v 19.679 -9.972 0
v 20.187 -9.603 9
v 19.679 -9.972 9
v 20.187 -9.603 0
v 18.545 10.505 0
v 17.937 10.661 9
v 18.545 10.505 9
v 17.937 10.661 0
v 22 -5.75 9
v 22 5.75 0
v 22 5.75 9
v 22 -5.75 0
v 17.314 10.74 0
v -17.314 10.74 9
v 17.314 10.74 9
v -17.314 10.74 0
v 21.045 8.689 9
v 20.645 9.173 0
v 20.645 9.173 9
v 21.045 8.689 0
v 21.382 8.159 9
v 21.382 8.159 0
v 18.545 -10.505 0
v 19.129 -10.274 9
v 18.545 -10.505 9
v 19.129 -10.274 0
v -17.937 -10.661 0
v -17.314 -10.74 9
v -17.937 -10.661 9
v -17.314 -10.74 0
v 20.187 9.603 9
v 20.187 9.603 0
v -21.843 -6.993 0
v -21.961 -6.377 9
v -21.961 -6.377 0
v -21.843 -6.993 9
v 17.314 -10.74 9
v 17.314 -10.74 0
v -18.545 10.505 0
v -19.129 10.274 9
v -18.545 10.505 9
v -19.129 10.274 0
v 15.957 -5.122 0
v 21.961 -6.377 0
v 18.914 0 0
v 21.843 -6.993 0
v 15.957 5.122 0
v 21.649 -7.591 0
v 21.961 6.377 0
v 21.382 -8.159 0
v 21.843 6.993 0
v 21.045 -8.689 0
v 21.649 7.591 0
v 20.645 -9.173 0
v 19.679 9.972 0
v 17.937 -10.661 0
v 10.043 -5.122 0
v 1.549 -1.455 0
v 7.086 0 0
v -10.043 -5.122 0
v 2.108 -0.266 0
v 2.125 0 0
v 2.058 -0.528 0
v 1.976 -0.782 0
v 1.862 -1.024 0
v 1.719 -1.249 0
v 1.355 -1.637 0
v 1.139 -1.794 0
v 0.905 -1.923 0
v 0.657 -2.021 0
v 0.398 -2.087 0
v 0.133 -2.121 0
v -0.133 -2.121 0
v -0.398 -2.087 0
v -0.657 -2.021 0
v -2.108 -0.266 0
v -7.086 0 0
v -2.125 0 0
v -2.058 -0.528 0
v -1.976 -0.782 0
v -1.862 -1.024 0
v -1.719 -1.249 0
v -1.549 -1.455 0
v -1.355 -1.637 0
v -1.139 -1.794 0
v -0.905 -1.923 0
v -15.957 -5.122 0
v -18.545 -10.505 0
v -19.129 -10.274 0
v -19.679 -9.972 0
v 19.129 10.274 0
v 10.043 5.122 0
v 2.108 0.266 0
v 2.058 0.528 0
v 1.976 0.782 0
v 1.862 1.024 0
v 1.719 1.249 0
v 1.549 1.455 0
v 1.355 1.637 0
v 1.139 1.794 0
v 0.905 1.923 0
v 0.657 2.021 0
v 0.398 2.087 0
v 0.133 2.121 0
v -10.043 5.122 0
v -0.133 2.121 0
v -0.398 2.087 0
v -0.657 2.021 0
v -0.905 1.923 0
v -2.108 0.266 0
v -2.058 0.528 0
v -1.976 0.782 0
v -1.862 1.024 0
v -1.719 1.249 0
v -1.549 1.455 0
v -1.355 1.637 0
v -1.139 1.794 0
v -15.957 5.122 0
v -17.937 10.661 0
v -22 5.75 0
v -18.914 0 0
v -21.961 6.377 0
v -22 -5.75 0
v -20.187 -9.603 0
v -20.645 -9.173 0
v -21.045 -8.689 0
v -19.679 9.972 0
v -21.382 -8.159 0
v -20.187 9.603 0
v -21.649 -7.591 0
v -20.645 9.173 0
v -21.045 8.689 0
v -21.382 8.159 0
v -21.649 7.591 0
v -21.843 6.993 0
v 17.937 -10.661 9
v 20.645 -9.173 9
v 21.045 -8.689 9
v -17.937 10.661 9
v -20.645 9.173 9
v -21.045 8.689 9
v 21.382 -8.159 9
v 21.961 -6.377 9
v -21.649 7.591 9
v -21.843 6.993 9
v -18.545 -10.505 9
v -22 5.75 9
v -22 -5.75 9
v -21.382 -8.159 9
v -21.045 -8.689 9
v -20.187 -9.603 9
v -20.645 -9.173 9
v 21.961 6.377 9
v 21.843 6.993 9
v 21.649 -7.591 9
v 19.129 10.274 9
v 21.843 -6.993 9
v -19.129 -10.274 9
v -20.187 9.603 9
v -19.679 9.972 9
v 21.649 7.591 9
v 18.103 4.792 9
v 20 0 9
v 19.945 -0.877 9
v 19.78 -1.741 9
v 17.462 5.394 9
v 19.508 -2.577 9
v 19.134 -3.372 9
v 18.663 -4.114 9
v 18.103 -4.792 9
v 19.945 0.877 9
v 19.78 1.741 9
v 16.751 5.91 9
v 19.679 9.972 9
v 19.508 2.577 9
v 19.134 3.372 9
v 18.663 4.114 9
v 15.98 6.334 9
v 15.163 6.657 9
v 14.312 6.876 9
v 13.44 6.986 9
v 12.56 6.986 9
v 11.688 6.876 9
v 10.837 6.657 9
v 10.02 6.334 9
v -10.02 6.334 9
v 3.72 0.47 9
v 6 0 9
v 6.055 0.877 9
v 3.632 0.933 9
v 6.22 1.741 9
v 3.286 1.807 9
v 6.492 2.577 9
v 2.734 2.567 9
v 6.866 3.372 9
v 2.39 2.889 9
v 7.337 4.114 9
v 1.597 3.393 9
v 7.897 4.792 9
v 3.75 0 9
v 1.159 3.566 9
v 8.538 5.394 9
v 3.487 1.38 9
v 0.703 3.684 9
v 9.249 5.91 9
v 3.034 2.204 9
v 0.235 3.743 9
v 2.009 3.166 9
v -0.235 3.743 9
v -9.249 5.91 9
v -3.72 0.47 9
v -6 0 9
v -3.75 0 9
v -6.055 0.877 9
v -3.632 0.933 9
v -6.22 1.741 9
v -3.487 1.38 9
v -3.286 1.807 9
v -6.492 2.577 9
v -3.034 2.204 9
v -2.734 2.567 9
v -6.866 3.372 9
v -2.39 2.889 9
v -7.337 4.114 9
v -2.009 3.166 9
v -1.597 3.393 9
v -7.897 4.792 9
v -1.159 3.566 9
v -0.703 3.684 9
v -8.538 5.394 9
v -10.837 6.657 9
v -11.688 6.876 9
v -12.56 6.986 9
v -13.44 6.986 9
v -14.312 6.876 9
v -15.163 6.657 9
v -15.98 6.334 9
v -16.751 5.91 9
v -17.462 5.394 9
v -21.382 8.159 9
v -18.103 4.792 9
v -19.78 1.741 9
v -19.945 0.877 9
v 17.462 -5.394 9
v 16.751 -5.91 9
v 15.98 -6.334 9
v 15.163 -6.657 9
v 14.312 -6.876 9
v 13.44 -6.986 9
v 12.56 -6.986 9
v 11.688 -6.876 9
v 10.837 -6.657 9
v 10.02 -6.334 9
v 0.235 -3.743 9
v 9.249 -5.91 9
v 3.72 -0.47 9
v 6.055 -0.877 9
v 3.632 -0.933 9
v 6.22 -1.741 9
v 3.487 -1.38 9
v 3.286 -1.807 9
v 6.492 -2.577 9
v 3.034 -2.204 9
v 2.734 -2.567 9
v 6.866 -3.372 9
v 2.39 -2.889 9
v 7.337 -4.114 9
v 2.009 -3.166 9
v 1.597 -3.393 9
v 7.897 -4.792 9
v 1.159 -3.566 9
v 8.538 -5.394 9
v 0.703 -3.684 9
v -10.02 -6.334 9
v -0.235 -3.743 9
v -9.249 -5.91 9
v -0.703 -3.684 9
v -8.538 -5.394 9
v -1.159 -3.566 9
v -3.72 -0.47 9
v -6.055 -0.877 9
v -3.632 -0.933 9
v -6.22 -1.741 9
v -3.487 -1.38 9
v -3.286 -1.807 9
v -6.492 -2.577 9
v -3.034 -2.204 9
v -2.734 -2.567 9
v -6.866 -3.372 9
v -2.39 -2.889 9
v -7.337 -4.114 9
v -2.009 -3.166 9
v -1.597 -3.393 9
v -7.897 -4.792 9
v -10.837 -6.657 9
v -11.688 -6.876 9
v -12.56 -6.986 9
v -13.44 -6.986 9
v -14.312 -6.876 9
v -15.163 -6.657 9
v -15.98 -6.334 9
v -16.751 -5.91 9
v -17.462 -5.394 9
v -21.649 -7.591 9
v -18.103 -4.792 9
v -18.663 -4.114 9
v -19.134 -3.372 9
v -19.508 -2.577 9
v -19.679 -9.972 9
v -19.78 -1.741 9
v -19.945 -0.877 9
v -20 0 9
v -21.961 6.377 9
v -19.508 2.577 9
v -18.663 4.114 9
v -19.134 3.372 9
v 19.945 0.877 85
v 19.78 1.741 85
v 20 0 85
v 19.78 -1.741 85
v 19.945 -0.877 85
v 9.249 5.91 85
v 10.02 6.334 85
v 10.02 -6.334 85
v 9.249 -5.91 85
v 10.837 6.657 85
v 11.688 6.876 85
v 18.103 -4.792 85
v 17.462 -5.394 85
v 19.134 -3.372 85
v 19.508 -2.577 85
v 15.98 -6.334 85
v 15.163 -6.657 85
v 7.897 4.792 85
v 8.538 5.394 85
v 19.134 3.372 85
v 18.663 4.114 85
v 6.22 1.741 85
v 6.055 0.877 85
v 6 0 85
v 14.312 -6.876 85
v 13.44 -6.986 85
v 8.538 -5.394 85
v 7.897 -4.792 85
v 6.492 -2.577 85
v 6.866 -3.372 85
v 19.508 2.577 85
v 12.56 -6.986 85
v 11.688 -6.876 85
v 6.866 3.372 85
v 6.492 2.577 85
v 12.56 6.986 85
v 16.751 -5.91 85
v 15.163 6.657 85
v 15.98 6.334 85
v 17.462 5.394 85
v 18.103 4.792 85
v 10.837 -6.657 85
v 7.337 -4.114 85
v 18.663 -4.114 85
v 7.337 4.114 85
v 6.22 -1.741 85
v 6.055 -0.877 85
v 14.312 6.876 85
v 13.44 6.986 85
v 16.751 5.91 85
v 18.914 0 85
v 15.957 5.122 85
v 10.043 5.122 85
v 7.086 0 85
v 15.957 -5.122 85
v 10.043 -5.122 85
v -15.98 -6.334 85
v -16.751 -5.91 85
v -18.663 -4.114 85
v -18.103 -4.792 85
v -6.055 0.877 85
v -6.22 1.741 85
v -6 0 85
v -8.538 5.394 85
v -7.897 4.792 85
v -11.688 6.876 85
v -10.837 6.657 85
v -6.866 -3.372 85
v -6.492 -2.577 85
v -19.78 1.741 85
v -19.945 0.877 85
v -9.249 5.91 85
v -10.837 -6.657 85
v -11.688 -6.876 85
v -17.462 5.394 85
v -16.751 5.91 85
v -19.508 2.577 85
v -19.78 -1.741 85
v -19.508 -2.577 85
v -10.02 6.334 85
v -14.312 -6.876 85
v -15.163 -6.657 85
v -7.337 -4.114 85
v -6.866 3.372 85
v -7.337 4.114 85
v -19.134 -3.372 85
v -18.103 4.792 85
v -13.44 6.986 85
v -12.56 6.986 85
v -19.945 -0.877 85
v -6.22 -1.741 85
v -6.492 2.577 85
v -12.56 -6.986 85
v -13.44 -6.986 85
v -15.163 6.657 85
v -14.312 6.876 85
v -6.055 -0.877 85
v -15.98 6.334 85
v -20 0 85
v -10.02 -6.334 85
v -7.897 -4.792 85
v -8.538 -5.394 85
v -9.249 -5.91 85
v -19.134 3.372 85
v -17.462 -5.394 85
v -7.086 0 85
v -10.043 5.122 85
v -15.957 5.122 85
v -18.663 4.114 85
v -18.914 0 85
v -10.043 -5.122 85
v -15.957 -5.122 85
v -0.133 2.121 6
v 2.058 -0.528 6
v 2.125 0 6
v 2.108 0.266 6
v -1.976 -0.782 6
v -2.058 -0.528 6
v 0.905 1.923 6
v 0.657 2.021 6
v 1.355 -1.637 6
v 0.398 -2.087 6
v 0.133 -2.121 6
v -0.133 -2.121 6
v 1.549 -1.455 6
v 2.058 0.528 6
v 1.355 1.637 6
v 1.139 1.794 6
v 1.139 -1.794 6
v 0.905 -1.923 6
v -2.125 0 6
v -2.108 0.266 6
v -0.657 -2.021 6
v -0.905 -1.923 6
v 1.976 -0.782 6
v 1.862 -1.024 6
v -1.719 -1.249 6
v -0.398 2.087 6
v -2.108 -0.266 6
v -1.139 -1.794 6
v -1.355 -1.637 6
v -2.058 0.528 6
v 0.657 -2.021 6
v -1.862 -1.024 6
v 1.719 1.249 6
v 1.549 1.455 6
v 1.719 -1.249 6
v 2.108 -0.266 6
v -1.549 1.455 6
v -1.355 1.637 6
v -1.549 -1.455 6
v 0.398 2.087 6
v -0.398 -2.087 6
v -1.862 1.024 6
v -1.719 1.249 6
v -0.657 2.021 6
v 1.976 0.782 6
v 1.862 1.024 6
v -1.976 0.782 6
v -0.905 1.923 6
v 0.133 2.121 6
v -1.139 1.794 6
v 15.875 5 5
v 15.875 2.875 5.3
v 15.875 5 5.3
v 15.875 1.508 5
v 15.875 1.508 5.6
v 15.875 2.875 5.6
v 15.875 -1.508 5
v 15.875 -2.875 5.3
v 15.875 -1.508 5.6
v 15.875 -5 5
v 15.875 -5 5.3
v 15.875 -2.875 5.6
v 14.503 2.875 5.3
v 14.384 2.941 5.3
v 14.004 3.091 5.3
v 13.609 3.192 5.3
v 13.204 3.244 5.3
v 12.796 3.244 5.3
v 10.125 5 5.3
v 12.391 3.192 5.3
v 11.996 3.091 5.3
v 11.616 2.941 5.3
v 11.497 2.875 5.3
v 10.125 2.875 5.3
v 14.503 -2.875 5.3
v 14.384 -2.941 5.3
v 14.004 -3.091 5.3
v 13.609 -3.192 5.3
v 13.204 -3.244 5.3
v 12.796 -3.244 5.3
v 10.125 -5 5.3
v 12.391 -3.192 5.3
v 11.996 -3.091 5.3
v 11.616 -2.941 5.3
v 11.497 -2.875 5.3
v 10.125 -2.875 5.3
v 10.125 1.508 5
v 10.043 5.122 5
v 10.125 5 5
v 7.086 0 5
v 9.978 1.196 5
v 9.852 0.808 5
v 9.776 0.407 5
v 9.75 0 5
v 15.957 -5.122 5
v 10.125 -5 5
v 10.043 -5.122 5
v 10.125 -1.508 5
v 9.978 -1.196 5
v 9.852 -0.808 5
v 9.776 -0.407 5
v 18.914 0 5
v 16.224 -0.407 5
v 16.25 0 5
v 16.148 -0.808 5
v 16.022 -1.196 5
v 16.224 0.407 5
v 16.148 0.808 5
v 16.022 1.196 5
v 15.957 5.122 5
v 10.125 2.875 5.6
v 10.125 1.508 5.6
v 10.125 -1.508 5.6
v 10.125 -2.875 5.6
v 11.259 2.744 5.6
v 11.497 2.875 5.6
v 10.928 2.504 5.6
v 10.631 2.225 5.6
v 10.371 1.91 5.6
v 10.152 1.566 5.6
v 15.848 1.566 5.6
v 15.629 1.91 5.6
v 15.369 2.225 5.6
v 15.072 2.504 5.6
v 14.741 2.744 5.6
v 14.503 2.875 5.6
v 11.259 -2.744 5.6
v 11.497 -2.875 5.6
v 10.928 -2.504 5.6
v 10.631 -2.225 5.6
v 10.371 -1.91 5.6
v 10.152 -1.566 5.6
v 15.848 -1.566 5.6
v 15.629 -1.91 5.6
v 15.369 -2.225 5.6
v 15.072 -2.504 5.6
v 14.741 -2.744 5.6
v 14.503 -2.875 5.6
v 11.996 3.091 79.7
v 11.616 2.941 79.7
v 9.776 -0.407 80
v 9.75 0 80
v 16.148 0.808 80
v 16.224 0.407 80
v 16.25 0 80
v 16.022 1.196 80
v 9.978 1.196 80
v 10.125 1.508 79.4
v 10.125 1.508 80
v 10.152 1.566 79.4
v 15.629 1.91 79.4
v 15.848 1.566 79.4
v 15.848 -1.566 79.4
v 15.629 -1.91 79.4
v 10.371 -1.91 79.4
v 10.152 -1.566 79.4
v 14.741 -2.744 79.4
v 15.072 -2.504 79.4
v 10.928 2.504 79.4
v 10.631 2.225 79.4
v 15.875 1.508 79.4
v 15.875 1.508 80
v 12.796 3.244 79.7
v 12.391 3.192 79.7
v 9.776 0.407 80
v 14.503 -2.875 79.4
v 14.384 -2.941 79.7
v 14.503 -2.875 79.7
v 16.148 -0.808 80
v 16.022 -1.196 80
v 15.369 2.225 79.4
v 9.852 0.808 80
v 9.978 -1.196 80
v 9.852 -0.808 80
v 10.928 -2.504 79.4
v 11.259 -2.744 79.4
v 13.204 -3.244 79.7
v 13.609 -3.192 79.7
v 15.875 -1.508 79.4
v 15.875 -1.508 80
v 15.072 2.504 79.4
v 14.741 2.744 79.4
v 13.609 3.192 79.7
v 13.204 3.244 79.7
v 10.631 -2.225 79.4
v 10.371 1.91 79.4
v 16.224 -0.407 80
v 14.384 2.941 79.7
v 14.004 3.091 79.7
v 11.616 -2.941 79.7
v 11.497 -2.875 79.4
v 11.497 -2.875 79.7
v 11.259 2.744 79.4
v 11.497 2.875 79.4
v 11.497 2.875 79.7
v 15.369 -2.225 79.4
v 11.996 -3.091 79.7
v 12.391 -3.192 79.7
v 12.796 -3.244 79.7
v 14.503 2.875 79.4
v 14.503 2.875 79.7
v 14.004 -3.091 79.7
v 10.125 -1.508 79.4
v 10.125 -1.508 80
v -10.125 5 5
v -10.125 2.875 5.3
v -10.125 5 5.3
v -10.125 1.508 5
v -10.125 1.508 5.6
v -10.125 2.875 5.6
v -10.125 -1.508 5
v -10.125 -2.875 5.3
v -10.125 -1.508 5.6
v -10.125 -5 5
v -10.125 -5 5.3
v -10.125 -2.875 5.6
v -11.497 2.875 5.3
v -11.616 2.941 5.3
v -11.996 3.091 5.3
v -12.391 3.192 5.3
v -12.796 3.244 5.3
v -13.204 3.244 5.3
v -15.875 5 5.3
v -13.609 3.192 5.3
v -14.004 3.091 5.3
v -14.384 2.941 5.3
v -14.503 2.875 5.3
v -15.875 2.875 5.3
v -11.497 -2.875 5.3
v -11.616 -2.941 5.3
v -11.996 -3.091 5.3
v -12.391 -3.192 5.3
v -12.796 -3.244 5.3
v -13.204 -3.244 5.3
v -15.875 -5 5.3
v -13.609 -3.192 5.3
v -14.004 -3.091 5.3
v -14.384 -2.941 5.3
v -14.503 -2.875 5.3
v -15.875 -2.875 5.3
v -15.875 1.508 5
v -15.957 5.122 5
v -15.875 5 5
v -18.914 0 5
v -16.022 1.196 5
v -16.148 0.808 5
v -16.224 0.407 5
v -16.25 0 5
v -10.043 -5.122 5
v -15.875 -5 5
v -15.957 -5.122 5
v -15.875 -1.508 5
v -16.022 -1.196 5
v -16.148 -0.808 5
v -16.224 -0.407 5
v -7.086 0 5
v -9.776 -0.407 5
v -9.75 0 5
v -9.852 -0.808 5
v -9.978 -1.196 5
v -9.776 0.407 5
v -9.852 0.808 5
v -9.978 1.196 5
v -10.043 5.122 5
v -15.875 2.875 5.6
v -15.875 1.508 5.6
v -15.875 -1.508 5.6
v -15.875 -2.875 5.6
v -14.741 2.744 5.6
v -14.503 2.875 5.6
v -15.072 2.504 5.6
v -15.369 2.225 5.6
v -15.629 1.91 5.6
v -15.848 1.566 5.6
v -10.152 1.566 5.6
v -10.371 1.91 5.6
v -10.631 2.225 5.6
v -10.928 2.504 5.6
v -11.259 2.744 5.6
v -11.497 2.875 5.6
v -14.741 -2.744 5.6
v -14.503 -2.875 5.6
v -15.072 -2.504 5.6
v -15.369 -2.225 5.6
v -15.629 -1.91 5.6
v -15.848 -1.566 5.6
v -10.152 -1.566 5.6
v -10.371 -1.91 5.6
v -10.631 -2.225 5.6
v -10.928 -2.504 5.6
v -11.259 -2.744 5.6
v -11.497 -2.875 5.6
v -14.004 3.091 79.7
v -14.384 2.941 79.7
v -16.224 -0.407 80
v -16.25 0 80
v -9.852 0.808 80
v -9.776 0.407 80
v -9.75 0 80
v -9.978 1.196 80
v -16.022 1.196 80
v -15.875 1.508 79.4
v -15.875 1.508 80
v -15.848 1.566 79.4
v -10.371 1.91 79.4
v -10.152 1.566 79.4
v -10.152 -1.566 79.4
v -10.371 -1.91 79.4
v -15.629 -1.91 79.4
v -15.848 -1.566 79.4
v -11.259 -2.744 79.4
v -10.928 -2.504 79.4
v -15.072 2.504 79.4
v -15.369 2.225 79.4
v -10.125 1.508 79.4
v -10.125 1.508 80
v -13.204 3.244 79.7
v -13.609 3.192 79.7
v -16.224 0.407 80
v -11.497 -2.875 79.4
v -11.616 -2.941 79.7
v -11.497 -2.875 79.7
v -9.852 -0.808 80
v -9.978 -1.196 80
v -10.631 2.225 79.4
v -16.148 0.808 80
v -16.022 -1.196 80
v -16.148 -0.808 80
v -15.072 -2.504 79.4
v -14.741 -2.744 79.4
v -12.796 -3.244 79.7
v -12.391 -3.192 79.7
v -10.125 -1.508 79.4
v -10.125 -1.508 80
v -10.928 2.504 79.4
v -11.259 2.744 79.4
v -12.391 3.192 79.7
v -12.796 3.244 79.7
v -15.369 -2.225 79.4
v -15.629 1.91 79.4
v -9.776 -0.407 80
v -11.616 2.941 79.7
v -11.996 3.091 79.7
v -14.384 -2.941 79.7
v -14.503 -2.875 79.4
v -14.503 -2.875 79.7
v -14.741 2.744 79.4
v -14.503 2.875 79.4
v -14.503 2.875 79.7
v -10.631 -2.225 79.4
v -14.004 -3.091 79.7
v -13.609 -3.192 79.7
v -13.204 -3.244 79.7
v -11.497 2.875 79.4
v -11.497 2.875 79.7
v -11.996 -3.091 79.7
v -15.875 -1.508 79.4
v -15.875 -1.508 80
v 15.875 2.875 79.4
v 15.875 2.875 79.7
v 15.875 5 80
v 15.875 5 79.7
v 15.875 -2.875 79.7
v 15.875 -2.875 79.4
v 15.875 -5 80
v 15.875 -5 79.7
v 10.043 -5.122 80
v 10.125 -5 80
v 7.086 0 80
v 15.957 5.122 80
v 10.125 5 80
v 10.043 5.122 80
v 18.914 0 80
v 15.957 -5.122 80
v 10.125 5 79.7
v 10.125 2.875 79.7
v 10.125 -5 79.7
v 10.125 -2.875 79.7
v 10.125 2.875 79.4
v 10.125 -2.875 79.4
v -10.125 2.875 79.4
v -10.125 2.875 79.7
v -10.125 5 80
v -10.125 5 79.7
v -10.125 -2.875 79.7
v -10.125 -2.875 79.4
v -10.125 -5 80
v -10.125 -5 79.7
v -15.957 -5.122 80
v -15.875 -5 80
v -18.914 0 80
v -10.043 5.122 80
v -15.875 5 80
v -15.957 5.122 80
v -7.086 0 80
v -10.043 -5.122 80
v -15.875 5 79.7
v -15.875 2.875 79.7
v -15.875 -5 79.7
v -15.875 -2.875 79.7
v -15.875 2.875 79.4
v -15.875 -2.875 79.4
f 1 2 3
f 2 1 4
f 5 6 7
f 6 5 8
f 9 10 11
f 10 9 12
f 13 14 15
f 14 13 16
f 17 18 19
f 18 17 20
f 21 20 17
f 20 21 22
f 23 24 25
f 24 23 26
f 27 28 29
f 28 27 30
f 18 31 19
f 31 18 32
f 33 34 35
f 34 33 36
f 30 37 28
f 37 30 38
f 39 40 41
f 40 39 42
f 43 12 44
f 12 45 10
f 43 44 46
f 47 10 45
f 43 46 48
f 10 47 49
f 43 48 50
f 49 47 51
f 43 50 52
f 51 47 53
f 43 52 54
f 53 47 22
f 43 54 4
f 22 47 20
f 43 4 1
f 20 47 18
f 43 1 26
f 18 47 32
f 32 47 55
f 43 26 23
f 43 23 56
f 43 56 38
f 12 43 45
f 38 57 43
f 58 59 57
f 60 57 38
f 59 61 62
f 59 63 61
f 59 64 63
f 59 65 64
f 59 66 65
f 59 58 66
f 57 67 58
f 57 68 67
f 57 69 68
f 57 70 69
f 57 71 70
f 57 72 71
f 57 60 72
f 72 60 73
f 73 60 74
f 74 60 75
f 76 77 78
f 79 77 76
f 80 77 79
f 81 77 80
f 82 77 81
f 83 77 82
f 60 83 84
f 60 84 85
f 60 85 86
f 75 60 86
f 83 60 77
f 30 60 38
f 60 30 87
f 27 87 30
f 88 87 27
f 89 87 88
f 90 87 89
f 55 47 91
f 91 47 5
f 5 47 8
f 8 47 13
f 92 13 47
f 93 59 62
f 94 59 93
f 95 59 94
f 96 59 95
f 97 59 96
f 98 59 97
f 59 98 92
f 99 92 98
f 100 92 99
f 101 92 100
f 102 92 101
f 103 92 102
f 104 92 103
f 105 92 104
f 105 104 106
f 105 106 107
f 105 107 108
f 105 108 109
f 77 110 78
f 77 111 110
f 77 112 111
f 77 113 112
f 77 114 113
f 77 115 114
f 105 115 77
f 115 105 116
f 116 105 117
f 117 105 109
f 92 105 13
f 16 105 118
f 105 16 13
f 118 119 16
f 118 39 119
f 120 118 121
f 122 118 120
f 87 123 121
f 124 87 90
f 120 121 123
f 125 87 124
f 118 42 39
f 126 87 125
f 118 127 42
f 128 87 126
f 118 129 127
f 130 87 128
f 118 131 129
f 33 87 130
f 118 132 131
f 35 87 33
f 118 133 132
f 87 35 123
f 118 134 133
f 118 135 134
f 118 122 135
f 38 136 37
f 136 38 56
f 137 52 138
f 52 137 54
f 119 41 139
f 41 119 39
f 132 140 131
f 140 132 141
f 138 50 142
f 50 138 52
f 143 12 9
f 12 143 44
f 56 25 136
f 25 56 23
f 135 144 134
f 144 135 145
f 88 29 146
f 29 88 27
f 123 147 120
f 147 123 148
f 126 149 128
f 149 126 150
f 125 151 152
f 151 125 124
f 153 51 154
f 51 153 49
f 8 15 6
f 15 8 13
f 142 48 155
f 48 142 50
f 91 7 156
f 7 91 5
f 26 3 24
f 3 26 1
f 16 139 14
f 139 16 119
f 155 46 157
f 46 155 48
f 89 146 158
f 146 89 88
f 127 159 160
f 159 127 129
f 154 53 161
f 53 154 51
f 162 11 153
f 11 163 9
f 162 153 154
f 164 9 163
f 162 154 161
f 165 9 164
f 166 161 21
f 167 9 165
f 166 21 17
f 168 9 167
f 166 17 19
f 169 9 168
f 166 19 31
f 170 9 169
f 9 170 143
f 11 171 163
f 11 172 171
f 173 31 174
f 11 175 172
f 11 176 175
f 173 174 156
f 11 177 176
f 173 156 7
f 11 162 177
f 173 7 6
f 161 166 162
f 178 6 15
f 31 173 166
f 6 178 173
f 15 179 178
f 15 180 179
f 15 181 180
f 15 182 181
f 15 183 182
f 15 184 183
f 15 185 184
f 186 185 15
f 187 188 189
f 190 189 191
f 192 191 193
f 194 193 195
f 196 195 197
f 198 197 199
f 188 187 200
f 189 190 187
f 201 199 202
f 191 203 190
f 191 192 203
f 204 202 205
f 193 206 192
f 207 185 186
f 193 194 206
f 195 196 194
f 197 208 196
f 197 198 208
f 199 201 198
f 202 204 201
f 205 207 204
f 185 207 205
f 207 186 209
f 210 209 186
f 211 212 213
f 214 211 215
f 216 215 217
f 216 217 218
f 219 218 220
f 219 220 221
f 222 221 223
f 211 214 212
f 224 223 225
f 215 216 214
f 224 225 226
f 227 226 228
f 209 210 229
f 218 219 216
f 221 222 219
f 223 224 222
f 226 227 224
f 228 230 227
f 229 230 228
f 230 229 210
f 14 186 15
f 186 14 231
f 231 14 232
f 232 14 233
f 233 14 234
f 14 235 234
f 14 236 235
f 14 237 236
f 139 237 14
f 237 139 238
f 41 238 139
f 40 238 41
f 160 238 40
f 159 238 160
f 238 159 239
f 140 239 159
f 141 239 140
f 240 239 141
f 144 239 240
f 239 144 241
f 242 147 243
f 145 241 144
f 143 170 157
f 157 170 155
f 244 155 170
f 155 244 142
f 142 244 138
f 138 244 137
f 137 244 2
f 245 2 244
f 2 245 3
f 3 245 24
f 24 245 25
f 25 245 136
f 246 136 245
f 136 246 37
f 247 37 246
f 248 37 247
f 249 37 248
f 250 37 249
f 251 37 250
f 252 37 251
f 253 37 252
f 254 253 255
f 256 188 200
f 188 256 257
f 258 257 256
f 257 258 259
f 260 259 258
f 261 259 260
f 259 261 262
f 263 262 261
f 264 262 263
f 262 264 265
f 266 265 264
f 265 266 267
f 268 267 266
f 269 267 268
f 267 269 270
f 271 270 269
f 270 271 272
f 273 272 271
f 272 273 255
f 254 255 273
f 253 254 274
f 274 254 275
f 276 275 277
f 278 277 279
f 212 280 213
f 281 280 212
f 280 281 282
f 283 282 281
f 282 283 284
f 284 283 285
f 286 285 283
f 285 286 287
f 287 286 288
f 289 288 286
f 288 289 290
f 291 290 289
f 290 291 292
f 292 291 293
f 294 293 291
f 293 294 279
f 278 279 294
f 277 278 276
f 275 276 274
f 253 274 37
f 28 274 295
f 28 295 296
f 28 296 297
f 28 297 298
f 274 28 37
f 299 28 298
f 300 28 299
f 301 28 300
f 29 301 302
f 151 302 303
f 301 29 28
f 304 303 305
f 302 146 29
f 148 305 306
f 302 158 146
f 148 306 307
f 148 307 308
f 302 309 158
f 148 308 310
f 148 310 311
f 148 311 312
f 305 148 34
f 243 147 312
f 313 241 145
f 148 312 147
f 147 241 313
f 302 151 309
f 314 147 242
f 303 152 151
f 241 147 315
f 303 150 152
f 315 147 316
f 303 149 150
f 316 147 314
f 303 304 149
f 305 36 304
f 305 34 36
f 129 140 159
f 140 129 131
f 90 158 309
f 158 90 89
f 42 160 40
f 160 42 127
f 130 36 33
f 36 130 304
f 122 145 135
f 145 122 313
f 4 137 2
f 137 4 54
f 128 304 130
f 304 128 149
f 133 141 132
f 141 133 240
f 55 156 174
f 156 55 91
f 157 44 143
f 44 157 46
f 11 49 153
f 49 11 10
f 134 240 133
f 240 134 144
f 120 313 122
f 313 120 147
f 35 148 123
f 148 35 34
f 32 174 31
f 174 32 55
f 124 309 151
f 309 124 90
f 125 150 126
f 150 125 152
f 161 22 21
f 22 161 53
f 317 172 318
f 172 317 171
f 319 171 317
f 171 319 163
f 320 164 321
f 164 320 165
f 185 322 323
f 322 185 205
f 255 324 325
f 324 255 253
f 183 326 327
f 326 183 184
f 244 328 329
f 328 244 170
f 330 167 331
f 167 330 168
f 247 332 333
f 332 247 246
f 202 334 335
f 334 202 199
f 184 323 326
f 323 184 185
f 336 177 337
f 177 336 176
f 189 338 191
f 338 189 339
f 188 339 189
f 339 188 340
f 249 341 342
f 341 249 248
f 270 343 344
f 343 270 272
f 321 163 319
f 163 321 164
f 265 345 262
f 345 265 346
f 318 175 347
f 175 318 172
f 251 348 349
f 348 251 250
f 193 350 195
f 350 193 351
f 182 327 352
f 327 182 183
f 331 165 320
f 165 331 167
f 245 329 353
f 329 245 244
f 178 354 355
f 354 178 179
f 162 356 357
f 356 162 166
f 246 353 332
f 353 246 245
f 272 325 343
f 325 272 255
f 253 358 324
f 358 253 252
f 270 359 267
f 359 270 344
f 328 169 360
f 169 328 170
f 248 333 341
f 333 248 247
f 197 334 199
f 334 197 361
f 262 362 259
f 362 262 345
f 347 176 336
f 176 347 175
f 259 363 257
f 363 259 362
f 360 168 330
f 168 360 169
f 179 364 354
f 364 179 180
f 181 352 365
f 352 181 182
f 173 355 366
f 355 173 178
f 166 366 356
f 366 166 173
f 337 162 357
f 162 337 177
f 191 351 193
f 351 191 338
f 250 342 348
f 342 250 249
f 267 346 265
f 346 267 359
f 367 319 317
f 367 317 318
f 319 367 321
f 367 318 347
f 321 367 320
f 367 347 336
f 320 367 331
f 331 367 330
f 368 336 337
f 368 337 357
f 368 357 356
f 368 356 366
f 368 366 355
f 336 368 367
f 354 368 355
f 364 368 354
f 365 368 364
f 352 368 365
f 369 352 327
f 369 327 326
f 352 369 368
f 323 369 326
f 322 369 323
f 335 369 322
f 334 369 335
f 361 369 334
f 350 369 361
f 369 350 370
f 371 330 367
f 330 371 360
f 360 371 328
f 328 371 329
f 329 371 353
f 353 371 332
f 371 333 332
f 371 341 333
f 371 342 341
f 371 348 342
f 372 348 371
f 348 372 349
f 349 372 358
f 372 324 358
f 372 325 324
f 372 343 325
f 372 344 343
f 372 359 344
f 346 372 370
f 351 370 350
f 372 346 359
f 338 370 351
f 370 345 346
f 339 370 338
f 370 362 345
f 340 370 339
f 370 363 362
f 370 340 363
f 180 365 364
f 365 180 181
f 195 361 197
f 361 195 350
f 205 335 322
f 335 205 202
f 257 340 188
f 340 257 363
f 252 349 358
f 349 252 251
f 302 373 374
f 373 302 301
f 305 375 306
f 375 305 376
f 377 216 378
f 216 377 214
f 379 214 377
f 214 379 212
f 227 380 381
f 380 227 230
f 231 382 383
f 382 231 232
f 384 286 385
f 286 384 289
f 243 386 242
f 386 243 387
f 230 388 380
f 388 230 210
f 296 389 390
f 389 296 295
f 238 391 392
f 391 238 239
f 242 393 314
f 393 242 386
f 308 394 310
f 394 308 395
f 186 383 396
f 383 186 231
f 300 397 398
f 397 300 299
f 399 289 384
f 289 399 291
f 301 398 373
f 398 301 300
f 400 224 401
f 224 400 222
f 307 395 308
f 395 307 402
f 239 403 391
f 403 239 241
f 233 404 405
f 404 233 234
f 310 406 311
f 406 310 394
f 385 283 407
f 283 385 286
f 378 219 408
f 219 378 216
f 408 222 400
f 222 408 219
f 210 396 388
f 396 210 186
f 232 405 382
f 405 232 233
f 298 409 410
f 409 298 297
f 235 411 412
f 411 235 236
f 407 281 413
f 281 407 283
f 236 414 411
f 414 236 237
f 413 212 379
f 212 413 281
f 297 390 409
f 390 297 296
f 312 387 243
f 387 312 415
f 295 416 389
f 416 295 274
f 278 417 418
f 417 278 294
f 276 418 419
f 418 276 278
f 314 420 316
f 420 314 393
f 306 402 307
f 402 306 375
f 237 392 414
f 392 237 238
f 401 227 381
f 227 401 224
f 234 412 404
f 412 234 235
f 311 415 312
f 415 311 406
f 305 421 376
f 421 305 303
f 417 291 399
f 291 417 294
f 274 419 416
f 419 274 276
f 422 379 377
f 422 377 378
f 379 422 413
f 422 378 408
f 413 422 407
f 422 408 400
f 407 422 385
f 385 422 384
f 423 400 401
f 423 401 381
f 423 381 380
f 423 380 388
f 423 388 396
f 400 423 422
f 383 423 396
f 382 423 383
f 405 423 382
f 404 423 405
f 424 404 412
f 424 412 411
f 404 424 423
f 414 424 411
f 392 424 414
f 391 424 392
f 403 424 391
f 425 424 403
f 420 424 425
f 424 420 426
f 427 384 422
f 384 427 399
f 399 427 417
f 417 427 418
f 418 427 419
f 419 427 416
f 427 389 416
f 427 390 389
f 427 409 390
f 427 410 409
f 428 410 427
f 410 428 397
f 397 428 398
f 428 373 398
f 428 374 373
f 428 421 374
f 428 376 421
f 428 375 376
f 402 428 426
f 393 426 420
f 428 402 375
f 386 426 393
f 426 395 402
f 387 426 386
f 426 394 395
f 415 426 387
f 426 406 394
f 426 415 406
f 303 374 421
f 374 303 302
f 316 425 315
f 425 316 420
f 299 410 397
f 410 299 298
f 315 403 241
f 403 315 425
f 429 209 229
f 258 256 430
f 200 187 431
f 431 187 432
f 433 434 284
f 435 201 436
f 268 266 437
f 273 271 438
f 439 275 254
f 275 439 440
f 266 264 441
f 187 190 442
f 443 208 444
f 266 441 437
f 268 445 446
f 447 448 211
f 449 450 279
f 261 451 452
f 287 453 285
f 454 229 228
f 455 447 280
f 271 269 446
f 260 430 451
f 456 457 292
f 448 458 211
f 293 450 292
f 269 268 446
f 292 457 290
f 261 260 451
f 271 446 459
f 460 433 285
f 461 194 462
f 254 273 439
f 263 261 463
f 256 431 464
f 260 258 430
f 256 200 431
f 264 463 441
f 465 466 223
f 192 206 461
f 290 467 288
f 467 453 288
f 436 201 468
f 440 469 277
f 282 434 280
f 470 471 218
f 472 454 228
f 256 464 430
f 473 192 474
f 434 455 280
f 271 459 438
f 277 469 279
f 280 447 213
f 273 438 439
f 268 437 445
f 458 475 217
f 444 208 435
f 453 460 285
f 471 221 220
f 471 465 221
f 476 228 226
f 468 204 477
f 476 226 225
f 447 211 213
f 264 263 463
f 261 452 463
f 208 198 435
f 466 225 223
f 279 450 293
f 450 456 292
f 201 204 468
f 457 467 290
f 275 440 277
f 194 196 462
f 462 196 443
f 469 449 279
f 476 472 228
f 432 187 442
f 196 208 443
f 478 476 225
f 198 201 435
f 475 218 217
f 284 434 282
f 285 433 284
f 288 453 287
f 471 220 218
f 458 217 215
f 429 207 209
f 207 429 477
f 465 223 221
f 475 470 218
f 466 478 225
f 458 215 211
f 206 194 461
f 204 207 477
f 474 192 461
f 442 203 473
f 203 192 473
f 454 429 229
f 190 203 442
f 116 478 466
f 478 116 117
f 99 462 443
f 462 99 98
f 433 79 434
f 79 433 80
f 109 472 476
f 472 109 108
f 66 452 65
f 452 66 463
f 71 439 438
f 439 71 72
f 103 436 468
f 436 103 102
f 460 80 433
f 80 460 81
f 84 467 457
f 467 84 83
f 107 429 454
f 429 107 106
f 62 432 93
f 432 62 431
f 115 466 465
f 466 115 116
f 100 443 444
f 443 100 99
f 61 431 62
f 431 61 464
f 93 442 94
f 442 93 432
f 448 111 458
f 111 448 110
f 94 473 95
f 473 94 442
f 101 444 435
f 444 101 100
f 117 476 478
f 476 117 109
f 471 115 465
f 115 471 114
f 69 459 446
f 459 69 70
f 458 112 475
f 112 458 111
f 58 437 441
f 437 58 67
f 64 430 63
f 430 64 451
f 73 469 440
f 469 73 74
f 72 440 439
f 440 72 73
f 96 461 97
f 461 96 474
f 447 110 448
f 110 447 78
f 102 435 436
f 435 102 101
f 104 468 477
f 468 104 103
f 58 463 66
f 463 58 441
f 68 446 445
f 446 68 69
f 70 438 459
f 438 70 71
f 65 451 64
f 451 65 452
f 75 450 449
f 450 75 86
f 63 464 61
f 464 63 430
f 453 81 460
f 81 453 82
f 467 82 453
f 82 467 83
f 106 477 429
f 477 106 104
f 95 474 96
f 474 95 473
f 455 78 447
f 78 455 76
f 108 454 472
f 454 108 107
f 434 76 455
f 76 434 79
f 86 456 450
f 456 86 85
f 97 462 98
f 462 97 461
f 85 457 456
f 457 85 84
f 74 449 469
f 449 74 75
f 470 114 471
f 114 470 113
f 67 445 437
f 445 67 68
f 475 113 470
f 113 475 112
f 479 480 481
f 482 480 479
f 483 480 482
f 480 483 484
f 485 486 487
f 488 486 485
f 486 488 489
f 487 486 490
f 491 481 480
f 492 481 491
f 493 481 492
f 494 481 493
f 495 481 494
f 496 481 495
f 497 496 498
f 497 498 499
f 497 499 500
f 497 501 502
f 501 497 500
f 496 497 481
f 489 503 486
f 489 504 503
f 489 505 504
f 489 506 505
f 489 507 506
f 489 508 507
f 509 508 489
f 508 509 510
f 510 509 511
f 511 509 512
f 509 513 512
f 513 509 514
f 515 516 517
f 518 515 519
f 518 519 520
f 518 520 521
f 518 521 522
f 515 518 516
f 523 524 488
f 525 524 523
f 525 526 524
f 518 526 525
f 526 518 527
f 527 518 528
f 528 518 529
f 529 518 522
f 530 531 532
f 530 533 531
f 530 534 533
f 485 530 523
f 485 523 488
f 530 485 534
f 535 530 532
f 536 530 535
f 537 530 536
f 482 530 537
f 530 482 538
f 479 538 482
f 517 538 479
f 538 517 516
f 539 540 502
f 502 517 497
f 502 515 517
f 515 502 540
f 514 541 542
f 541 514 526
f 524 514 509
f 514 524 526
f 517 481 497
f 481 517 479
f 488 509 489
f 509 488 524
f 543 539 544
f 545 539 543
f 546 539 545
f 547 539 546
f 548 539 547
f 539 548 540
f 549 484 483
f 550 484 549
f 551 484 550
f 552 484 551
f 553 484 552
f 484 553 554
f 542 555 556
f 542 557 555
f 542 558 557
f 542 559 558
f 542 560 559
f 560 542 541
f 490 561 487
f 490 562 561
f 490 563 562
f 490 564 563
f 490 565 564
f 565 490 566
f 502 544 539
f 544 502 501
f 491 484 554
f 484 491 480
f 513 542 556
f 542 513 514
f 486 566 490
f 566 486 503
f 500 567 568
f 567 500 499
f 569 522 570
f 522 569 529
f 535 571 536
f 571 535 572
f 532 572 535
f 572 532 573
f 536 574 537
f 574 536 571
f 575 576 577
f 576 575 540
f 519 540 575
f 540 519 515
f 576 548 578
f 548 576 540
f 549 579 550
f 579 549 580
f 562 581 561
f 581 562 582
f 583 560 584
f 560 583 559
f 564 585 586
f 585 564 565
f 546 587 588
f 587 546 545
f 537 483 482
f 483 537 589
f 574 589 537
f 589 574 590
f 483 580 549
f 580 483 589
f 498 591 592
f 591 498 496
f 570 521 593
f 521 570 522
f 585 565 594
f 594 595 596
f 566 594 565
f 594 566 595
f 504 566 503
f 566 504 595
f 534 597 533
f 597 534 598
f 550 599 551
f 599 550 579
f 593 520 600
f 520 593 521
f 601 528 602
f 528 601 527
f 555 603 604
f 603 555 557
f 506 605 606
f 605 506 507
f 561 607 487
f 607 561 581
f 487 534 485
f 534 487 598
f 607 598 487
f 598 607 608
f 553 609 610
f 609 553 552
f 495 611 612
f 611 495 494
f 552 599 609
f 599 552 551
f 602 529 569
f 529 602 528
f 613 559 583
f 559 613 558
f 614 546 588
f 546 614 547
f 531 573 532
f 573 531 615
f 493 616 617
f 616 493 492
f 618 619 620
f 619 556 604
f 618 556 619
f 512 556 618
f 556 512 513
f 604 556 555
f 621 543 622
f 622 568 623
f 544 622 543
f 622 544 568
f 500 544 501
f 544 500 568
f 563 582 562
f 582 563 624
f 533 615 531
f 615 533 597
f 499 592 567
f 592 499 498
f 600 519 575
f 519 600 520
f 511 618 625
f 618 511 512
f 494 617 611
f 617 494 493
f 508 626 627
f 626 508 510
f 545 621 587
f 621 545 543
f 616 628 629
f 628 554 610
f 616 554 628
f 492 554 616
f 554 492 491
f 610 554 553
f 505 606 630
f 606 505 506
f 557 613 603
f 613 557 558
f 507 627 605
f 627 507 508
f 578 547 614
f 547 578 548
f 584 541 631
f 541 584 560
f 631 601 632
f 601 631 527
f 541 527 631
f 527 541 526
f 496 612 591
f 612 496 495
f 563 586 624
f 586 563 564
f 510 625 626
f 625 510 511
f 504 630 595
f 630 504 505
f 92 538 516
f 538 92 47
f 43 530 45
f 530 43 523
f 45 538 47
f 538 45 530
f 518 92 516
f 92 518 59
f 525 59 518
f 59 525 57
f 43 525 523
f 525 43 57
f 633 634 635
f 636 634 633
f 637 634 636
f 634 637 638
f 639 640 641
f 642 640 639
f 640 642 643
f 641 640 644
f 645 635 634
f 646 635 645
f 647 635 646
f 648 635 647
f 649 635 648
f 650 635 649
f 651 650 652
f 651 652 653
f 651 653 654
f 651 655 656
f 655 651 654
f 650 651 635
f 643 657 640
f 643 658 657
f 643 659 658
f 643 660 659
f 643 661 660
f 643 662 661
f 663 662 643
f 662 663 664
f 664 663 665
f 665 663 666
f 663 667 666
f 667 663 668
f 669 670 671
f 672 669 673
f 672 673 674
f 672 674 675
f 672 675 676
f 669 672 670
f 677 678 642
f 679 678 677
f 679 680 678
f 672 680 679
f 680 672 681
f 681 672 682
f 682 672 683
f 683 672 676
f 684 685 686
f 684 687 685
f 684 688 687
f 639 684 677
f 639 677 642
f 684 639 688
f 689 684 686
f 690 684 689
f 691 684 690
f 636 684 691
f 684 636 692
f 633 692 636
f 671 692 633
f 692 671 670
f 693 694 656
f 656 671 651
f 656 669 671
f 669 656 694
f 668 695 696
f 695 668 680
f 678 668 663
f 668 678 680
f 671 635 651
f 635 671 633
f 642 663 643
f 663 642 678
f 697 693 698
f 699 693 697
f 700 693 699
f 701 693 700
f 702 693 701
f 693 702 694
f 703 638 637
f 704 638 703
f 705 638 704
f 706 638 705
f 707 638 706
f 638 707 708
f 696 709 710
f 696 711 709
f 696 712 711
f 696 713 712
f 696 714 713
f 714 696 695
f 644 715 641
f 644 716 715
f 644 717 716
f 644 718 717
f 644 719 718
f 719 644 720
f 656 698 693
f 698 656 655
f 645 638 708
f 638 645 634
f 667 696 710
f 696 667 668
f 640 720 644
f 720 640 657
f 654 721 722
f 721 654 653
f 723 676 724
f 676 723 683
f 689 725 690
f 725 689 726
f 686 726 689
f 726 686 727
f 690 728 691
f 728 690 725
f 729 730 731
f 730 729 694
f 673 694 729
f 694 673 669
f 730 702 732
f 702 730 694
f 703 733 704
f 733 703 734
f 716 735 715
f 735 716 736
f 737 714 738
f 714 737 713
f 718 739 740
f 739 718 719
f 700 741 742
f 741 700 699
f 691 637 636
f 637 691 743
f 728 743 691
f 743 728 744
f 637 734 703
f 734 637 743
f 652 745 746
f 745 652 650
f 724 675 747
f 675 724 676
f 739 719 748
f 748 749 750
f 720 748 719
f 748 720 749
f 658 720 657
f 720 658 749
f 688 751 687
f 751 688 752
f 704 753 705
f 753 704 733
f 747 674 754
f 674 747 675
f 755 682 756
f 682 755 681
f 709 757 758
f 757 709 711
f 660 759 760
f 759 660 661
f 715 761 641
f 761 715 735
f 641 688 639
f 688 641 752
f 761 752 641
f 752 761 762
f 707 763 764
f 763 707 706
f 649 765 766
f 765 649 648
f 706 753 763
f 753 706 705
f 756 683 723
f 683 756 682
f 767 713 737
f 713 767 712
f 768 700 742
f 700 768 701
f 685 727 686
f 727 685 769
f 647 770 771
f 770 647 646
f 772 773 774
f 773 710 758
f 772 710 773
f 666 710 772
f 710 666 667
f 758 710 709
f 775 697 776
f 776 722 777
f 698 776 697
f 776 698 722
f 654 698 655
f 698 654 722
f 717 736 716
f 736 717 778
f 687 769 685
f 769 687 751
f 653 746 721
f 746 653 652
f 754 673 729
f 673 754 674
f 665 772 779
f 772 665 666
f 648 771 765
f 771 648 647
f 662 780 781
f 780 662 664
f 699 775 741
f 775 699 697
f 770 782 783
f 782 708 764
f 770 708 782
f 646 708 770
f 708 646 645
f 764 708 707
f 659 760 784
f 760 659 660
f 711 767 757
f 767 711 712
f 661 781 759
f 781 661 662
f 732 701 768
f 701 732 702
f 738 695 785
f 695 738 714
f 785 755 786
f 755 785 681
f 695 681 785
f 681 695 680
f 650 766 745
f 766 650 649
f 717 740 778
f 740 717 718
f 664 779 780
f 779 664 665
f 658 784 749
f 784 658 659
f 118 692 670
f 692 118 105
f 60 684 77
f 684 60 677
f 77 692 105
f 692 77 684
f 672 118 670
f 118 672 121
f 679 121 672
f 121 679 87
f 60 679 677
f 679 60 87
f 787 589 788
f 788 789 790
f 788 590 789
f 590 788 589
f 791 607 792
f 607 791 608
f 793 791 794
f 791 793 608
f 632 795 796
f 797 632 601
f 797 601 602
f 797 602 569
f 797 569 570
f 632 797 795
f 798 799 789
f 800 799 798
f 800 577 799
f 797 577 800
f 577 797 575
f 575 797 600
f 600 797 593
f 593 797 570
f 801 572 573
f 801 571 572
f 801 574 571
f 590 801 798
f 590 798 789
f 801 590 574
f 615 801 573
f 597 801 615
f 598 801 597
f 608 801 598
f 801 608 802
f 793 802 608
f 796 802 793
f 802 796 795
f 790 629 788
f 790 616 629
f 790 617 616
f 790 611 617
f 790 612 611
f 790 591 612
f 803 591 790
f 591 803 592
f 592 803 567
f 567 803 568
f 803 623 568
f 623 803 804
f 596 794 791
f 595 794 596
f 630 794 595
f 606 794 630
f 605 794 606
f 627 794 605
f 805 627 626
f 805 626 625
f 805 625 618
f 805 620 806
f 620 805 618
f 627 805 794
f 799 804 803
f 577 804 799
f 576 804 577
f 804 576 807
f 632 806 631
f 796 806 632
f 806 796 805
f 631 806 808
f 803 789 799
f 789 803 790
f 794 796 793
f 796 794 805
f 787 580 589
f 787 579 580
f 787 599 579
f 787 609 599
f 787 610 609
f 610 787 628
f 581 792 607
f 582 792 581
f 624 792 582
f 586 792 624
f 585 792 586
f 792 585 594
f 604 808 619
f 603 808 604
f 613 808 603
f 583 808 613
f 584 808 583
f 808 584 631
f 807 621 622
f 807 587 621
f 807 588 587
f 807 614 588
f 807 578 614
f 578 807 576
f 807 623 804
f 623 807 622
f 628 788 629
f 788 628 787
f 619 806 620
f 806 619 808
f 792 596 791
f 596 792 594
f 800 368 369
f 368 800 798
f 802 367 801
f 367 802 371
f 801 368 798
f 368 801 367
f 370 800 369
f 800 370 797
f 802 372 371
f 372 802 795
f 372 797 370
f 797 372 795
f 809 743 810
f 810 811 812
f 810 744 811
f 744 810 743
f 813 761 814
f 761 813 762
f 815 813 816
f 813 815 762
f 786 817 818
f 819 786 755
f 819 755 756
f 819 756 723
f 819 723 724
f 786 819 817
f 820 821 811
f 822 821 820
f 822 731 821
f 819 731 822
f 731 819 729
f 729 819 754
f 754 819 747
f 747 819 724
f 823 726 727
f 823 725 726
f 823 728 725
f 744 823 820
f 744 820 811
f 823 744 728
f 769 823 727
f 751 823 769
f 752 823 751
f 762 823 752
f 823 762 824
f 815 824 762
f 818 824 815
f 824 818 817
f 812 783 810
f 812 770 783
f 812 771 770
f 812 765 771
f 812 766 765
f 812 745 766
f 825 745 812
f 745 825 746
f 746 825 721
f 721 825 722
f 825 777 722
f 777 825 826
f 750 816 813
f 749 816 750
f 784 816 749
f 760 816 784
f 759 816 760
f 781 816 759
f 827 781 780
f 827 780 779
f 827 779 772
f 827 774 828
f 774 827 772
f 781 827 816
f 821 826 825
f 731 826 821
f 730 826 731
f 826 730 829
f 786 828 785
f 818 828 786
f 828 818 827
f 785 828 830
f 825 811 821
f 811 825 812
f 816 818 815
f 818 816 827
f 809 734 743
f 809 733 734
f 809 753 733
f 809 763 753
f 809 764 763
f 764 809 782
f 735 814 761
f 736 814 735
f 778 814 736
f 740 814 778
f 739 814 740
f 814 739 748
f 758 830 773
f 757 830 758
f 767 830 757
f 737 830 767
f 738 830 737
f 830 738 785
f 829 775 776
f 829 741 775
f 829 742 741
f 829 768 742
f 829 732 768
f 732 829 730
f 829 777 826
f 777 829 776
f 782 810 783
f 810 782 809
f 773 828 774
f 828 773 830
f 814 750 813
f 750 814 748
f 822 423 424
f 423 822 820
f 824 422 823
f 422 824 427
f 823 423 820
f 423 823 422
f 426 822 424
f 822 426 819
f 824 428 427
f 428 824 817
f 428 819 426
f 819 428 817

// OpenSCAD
$fn = 50;


difference() {
	union() {
		hull() {
			translate(v = [-17.0000000000, 5.7500000000, 0]) {
				cylinder(h = 9, r = 5);
			}
			translate(v = [17.0000000000, 5.7500000000, 0]) {
				cylinder(h = 9, r = 5);
			}
			translate(v = [-17.0000000000, -5.7500000000, 0]) {
				cylinder(h = 9, r = 5);
			}
			translate(v = [17.0000000000, -5.7500000000, 0]) {
				cylinder(h = 9, r = 5);
			}
		}
		translate(v = [13.0000000000, 0, 0.0000000000]) {
			cylinder(h = 85, r = 7.0000000000);
		}
		translate(v = [-13.0000000000, 0, 0.0000000000]) {
			cylinder(h = 85, r = 7.0000000000);
		}
		translate(v = [13.0000000000, 0, 79.0000000000]) {
			cylinder(h = 6, r = 7.0000000000);
		}
		translate(v = [-13.0000000000, 0, 79.0000000000]) {
			cylinder(h = 6, r = 7.0000000000);
		}
	}
	union() {
		translate(v = [0, 0, 9]) {
			rotate(a = [0, 0, 0]) {
				difference() {
					union() {
						#translate(v = [0, 0, -80.0000000000]) {
							cylinder(h = 80, r = 2.0000000000);
						}
						#translate(v = [0, 0, -3]) {
							cylinder(h = 3, r1 = 2.1250000000, r2 = 3.7500000000);
						}
						#translate(v = [0, 0, -80.0000000000]) {
							cylinder(h = 80, r = 2.1250000000);
						}
						#translate(v = [0, 0, -80.0000000000]) {
							cylinder(h = 80, r = 2.0000000000);
						}
					}
					union();
				}
			}
		}
		translate(v = [13.0000000000, 0, 0]) {
			rotate(a = [0, 0, 0]) {
				difference() {
					union() {
						#translate(v = [-2.8750000000, -5.0000000000, -0.3000000000]) {
							cube(size = [5.7500000000, 10, 0.3000000000]);
						}
						#translate(v = [-2.8750000000, -2.8750000000, -0.6000000000]) {
							cube(size = [5.7500000000, 5.7500000000, 0.3000000000]);
						}
						#translate(v = [-2.8750000000, -5.0000000000, 5]) {
							cube(size = [5.7500000000, 10, 0.3000000000]);
						}
						#translate(v = [-2.8750000000, -2.8750000000, 5.3000000000]) {
							cube(size = [5.7500000000, 5.7500000000, 0.3000000000]);
						}
						#translate(v = [0, 0, -100.0000000000]) {
							cylinder(h = 200, r = 3.2500000000);
						}
						#linear_extrude(height = 5) {
							polygon(points = [[5.9142500000, 0.0000000000], [2.9571250000, 5.1218907443], [-2.9571250000, 5.1218907443], [-5.9142500000, 0.0000000000], [-2.9571250000, -5.1218907443], [2.9571250000, -5.1218907443]]);
						}
						#translate(v = [-2.8750000000, -5.0000000000, -0.3000000000]) {
							cube(size = [5.7500000000, 10, 0.3000000000]);
						}
						#translate(v = [-2.8750000000, -2.8750000000, -0.6000000000]) {
							cube(size = [5.7500000000, 5.7500000000, 0.3000000000]);
						}
						#translate(v = [-2.8750000000, -5.0000000000, 5]) {
							cube(size = [5.7500000000, 10, 0.3000000000]);
						}
						#translate(v = [-2.8750000000, -2.8750000000, 5.3000000000]) {
							cube(size = [5.7500000000, 5.7500000000, 0.3000000000]);
						}
						#translate(v = [0, 0, -100.0000000000]) {
							cylinder(h = 200, r = 3.2500000000);
						}
						#translate(v = [-2.8750000000, -5.0000000000, -0.3000000000]) {
							cube(size = [5.7500000000, 10, 0.3000000000]);
						}
						#translate(v = [-2.8750000000, -2.8750000000, -0.6000000000]) {
							cube(size = [5.7500000000, 5.7500000000, 0.3000000000]);
						}
						#translate(v = [-2.8750000000, -5.0000000000, 5]) {
							cube(size = [5.7500000000, 10, 0.3000000000]);
						}
						#translate(v = [-2.8750000000, -2.8750000000, 5.3000000000]) {
							cube(size = [5.7500000000, 5.7500000000, 0.3000000000]);
						}
						#translate(v = [0, 0, -100.0000000000]) {
							cylinder(h = 200, r = 3.2500000000);
						}
					}
					union();
				}
			}
		}
		translate(v = [-13.0000000000, 0, 0]) {
			rotate(a = [0, 0, 0]) {
				difference() {
					union() {
						#translate(v = [-2.8750000000, -5.0000000000, -0.3000000000]) {
							cube(size = [5.7500000000, 10, 0.3000000000]);
						}
						#translate(v = [-2.8750000000, -2.8750000000, -0.6000000000]) {
							cube(size = [5.7500000000, 5.7500000000, 0.3000000000]);
						}
						#translate(v = [-2.8750000000, -5.0000000000, 5]) {
							cube(size = [5.7500000000, 10, 0.3000000000]);
						}
						#translate(v = [-2.8750000000, -2.8750000000, 5.3000000000]) {
							cube(size = [5.7500000000, 5.7500000000, 0.3000000000]);
						}
						#translate(v = [0, 0, -100.0000000000]) {
							cylinder(h = 200, r = 3.2500000000);
						}
						#linear_extrude(height = 5) {
							polygon(points = [[5.9142500000, 0.0000000000], [2.9571250000, 5.1218907443], [-2.9571250000, 5.1218907443], [-5.9142500000, 0.0000000000], [-2.9571250000, -5.1218907443], [2.9571250000, -5.1218907443]]);
						}
						#translate(v = [-2.8750000000, -5.0000000000, -0.3000000000]) {
							cube(size = [5.7500000000, 10, 0.3000000000]);
						}
						#translate(v = [-2.8750000000, -2.8750000000, -0.6000000000]) {
							cube(size = [5.7500000000, 5.7500000000, 0.3000000000]);
						}
						#translate(v = [-2.8750000000, -5.0000000000, 5]) {
							cube(size = [5.7500000000, 10, 0.3000000000]);
						}
						#translate(v = [-2.8750000000, -2.8750000000, 5.3000000000]) {
							cube(size = [5.7500000000, 5.7500000000, 0.3000000000]);
						}
						#translate(v = [0, 0, -100.0000000000]) {
							cylinder(h = 200, r = 3.2500000000);
						}
						#translate(v = [-2.8750000000, -5.0000000000, -0.3000000000]) {
							cube(size = [5.7500000000, 10, 0.3000000000]);
						}
						#translate(v = [-2.8750000000, -2.8750000000, -0.6000000000]) {
							cube(size = [5.7500000000, 5.7500000000, 0.3000000000]);
						}
						#translate(v = [-2.8750000000, -5.0000000000, 5]) {
							cube(size = [5.7500000000, 10, 0.3000000000]);
						}
						#translate(v = [-2.8750000000, -2.8750000000, 5.3000000000]) {
							cube(size = [5.7500000000, 5.7500000000, 0.3000000000]);
						}
						#translate(v = [0, 0, -100.0000000000]) {
							cylinder(h = 200, r = 3.2500000000);
						}
					}
					union();
				}
			}
		}
		translate(v = [13.0000000000, 0, 85]) {
			rotate(a = [0, 0, 0]) {
				difference() {
					union() {
						#translate(v = [-2.8750000000, -5.0000000000, -5.3000000000]) {
							cube(size = [5.7500000000, 10, 0.3000000000]);
						}
						#translate(v = [-2.8750000000, -2.8750000000, -5.6000000000]) {
							cube(size = [5.7500000000, 5.7500000000, 0.3000000000]);
						}
						#translate(v = [-2.8750000000, -5.0000000000, 0]) {
							cube(size = [5.7500000000, 10, 0.3000000000]);
						}
						#translate(v = [-2.8750000000, -2.8750000000, 0.3000000000]) {
							cube(size = [5.7500000000, 5.7500000000, 0.3000000000]);
						}
						#translate(v = [0, 0, -100.0000000000]) {
							cylinder(h = 200, r = 3.2500000000);
						}
						translate(v = [0, 0, -5]) {
							#linear_extrude(height = 5) {
								polygon(points = [[5.9142500000, 0.0000000000], [2.9571250000, 5.1218907443], [-2.9571250000, 5.1218907443], [-5.9142500000, 0.0000000000], [-2.9571250000, -5.1218907443], [2.9571250000, -5.1218907443]]);
							}
						}
						#translate(v = [-2.8750000000, -5.0000000000, -5.3000000000]) {
							cube(size = [5.7500000000, 10, 0.3000000000]);
						}
						#translate(v = [-2.8750000000, -2.8750000000, -5.6000000000]) {
							cube(size = [5.7500000000, 5.7500000000, 0.3000000000]);
						}
						#translate(v = [-2.8750000000, -5.0000000000, 0]) {
							cube(size = [5.7500000000, 10, 0.3000000000]);
						}
						#translate(v = [-2.8750000000, -2.8750000000, 0.3000000000]) {
							cube(size = [5.7500000000, 5.7500000000, 0.3000000000]);
						}
						#translate(v = [0, 0, -100.0000000000]) {
							cylinder(h = 200, r = 3.2500000000);
						}
						#translate(v = [-2.8750000000, -5.0000000000, -5.3000000000]) {
							cube(size = [5.7500000000, 10, 0.3000000000]);
						}
						#translate(v = [-2.8750000000, -2.8750000000, -5.6000000000]) {
							cube(size = [5.7500000000, 5.7500000000, 0.3000000000]);
						}
						#translate(v = [-2.8750000000, -5.0000000000, 0]) {
							cube(size = [5.7500000000, 10, 0.3000000000]);
						}
						#translate(v = [-2.8750000000, -2.8750000000, 0.3000000000]) {
							cube(size = [5.7500000000, 5.7500000000, 0.3000000000]);
						}
						#translate(v = [0, 0, -100.0000000000]) {
							cylinder(h = 200, r = 3.2500000000);
						}
					}
					union();
				}
			}
		}
		translate(v = [-13.0000000000, 0, 85]) {
			rotate(a = [0, 0, 0]) {
				difference() {
					union() {
						#translate(v = [-2.8750000000, -5.0000000000, -5.3000000000]) {
							cube(size = [5.7500000000, 10, 0.3000000000]);
						}
						#translate(v = [-2.8750000000, -2.8750000000, -5.6000000000]) {
							cube(size = [5.7500000000, 5.7500000000, 0.3000000000]);
						}
						#translate(v = [-2.8750000000, -5.0000000000, 0]) {
							cube(size = [5.7500000000, 10, 0.3000000000]);
						}
						#translate(v = [-2.8750000000, -2.8750000000, 0.3000000000]) {
							cube(size = [5.7500000000, 5.7500000000, 0.3000000000]);
						}
						#translate(v = [0, 0, -100.0000000000]) {
							cylinder(h = 200, r = 3.2500000000);
						}
						translate(v = [0, 0, -5]) {
							#linear_extrude(height = 5) {
								polygon(points = [[5.9142500000, 0.0000000000], [2.9571250000, 5.1218907443], [-2.9571250000, 5.1218907443], [-5.9142500000, 0.0000000000], [-2.9571250000, -5.1218907443], [2.9571250000, -5.1218907443]]);
							}
						}
						#translate(v = [-2.8750000000, -5.0000000000, -5.3000000000]) {
							cube(size = [5.7500000000, 10, 0.3000000000]);
						}
						#translate(v = [-2.8750000000, -2.8750000000, -5.6000000000]) {
							cube(size = [5.7500000000, 5.7500000000, 0.3000000000]);
						}
						#translate(v = [-2.8750000000, -5.0000000000, 0]) {
							cube(size = [5.7500000000, 10, 0.3000000000]);
						}
						#translate(v = [-2.8750000000, -2.8750000000, 0.3000000000]) {
							cube(size = [5.7500000000, 5.7500000000, 0.3000000000]);
						}
						#translate(v = [0, 0, -100.0000000000]) {
							cylinder(h = 200, r = 3.2500000000);
						}
						#translate(v = [-2.8750000000, -5.0000000000, -5.3000000000]) {
							cube(size = [5.7500000000, 10, 0.3000000000]);
						}
						#translate(v = [-2.8750000000, -2.8750000000, -5.6000000000]) {
							cube(size = [5.7500000000, 5.7500000000, 0.3000000000]);
						}
						#translate(v = [-2.8750000000, -5.0000000000, 0]) {
							cube(size = [5.7500000000, 10, 0.3000000000]);
						}
						#translate(v = [-2.8750000000, -2.8750000000, 0.3000000000]) {
							cube(size = [5.7500000000, 5.7500000000, 0.3000000000]);
						}
						#translate(v = [0, 0, -100.0000000000]) {
							cylinder(h = 200, r = 3.2500000000);
						}
					}
					union();
				}
			}
		}
	}
}
